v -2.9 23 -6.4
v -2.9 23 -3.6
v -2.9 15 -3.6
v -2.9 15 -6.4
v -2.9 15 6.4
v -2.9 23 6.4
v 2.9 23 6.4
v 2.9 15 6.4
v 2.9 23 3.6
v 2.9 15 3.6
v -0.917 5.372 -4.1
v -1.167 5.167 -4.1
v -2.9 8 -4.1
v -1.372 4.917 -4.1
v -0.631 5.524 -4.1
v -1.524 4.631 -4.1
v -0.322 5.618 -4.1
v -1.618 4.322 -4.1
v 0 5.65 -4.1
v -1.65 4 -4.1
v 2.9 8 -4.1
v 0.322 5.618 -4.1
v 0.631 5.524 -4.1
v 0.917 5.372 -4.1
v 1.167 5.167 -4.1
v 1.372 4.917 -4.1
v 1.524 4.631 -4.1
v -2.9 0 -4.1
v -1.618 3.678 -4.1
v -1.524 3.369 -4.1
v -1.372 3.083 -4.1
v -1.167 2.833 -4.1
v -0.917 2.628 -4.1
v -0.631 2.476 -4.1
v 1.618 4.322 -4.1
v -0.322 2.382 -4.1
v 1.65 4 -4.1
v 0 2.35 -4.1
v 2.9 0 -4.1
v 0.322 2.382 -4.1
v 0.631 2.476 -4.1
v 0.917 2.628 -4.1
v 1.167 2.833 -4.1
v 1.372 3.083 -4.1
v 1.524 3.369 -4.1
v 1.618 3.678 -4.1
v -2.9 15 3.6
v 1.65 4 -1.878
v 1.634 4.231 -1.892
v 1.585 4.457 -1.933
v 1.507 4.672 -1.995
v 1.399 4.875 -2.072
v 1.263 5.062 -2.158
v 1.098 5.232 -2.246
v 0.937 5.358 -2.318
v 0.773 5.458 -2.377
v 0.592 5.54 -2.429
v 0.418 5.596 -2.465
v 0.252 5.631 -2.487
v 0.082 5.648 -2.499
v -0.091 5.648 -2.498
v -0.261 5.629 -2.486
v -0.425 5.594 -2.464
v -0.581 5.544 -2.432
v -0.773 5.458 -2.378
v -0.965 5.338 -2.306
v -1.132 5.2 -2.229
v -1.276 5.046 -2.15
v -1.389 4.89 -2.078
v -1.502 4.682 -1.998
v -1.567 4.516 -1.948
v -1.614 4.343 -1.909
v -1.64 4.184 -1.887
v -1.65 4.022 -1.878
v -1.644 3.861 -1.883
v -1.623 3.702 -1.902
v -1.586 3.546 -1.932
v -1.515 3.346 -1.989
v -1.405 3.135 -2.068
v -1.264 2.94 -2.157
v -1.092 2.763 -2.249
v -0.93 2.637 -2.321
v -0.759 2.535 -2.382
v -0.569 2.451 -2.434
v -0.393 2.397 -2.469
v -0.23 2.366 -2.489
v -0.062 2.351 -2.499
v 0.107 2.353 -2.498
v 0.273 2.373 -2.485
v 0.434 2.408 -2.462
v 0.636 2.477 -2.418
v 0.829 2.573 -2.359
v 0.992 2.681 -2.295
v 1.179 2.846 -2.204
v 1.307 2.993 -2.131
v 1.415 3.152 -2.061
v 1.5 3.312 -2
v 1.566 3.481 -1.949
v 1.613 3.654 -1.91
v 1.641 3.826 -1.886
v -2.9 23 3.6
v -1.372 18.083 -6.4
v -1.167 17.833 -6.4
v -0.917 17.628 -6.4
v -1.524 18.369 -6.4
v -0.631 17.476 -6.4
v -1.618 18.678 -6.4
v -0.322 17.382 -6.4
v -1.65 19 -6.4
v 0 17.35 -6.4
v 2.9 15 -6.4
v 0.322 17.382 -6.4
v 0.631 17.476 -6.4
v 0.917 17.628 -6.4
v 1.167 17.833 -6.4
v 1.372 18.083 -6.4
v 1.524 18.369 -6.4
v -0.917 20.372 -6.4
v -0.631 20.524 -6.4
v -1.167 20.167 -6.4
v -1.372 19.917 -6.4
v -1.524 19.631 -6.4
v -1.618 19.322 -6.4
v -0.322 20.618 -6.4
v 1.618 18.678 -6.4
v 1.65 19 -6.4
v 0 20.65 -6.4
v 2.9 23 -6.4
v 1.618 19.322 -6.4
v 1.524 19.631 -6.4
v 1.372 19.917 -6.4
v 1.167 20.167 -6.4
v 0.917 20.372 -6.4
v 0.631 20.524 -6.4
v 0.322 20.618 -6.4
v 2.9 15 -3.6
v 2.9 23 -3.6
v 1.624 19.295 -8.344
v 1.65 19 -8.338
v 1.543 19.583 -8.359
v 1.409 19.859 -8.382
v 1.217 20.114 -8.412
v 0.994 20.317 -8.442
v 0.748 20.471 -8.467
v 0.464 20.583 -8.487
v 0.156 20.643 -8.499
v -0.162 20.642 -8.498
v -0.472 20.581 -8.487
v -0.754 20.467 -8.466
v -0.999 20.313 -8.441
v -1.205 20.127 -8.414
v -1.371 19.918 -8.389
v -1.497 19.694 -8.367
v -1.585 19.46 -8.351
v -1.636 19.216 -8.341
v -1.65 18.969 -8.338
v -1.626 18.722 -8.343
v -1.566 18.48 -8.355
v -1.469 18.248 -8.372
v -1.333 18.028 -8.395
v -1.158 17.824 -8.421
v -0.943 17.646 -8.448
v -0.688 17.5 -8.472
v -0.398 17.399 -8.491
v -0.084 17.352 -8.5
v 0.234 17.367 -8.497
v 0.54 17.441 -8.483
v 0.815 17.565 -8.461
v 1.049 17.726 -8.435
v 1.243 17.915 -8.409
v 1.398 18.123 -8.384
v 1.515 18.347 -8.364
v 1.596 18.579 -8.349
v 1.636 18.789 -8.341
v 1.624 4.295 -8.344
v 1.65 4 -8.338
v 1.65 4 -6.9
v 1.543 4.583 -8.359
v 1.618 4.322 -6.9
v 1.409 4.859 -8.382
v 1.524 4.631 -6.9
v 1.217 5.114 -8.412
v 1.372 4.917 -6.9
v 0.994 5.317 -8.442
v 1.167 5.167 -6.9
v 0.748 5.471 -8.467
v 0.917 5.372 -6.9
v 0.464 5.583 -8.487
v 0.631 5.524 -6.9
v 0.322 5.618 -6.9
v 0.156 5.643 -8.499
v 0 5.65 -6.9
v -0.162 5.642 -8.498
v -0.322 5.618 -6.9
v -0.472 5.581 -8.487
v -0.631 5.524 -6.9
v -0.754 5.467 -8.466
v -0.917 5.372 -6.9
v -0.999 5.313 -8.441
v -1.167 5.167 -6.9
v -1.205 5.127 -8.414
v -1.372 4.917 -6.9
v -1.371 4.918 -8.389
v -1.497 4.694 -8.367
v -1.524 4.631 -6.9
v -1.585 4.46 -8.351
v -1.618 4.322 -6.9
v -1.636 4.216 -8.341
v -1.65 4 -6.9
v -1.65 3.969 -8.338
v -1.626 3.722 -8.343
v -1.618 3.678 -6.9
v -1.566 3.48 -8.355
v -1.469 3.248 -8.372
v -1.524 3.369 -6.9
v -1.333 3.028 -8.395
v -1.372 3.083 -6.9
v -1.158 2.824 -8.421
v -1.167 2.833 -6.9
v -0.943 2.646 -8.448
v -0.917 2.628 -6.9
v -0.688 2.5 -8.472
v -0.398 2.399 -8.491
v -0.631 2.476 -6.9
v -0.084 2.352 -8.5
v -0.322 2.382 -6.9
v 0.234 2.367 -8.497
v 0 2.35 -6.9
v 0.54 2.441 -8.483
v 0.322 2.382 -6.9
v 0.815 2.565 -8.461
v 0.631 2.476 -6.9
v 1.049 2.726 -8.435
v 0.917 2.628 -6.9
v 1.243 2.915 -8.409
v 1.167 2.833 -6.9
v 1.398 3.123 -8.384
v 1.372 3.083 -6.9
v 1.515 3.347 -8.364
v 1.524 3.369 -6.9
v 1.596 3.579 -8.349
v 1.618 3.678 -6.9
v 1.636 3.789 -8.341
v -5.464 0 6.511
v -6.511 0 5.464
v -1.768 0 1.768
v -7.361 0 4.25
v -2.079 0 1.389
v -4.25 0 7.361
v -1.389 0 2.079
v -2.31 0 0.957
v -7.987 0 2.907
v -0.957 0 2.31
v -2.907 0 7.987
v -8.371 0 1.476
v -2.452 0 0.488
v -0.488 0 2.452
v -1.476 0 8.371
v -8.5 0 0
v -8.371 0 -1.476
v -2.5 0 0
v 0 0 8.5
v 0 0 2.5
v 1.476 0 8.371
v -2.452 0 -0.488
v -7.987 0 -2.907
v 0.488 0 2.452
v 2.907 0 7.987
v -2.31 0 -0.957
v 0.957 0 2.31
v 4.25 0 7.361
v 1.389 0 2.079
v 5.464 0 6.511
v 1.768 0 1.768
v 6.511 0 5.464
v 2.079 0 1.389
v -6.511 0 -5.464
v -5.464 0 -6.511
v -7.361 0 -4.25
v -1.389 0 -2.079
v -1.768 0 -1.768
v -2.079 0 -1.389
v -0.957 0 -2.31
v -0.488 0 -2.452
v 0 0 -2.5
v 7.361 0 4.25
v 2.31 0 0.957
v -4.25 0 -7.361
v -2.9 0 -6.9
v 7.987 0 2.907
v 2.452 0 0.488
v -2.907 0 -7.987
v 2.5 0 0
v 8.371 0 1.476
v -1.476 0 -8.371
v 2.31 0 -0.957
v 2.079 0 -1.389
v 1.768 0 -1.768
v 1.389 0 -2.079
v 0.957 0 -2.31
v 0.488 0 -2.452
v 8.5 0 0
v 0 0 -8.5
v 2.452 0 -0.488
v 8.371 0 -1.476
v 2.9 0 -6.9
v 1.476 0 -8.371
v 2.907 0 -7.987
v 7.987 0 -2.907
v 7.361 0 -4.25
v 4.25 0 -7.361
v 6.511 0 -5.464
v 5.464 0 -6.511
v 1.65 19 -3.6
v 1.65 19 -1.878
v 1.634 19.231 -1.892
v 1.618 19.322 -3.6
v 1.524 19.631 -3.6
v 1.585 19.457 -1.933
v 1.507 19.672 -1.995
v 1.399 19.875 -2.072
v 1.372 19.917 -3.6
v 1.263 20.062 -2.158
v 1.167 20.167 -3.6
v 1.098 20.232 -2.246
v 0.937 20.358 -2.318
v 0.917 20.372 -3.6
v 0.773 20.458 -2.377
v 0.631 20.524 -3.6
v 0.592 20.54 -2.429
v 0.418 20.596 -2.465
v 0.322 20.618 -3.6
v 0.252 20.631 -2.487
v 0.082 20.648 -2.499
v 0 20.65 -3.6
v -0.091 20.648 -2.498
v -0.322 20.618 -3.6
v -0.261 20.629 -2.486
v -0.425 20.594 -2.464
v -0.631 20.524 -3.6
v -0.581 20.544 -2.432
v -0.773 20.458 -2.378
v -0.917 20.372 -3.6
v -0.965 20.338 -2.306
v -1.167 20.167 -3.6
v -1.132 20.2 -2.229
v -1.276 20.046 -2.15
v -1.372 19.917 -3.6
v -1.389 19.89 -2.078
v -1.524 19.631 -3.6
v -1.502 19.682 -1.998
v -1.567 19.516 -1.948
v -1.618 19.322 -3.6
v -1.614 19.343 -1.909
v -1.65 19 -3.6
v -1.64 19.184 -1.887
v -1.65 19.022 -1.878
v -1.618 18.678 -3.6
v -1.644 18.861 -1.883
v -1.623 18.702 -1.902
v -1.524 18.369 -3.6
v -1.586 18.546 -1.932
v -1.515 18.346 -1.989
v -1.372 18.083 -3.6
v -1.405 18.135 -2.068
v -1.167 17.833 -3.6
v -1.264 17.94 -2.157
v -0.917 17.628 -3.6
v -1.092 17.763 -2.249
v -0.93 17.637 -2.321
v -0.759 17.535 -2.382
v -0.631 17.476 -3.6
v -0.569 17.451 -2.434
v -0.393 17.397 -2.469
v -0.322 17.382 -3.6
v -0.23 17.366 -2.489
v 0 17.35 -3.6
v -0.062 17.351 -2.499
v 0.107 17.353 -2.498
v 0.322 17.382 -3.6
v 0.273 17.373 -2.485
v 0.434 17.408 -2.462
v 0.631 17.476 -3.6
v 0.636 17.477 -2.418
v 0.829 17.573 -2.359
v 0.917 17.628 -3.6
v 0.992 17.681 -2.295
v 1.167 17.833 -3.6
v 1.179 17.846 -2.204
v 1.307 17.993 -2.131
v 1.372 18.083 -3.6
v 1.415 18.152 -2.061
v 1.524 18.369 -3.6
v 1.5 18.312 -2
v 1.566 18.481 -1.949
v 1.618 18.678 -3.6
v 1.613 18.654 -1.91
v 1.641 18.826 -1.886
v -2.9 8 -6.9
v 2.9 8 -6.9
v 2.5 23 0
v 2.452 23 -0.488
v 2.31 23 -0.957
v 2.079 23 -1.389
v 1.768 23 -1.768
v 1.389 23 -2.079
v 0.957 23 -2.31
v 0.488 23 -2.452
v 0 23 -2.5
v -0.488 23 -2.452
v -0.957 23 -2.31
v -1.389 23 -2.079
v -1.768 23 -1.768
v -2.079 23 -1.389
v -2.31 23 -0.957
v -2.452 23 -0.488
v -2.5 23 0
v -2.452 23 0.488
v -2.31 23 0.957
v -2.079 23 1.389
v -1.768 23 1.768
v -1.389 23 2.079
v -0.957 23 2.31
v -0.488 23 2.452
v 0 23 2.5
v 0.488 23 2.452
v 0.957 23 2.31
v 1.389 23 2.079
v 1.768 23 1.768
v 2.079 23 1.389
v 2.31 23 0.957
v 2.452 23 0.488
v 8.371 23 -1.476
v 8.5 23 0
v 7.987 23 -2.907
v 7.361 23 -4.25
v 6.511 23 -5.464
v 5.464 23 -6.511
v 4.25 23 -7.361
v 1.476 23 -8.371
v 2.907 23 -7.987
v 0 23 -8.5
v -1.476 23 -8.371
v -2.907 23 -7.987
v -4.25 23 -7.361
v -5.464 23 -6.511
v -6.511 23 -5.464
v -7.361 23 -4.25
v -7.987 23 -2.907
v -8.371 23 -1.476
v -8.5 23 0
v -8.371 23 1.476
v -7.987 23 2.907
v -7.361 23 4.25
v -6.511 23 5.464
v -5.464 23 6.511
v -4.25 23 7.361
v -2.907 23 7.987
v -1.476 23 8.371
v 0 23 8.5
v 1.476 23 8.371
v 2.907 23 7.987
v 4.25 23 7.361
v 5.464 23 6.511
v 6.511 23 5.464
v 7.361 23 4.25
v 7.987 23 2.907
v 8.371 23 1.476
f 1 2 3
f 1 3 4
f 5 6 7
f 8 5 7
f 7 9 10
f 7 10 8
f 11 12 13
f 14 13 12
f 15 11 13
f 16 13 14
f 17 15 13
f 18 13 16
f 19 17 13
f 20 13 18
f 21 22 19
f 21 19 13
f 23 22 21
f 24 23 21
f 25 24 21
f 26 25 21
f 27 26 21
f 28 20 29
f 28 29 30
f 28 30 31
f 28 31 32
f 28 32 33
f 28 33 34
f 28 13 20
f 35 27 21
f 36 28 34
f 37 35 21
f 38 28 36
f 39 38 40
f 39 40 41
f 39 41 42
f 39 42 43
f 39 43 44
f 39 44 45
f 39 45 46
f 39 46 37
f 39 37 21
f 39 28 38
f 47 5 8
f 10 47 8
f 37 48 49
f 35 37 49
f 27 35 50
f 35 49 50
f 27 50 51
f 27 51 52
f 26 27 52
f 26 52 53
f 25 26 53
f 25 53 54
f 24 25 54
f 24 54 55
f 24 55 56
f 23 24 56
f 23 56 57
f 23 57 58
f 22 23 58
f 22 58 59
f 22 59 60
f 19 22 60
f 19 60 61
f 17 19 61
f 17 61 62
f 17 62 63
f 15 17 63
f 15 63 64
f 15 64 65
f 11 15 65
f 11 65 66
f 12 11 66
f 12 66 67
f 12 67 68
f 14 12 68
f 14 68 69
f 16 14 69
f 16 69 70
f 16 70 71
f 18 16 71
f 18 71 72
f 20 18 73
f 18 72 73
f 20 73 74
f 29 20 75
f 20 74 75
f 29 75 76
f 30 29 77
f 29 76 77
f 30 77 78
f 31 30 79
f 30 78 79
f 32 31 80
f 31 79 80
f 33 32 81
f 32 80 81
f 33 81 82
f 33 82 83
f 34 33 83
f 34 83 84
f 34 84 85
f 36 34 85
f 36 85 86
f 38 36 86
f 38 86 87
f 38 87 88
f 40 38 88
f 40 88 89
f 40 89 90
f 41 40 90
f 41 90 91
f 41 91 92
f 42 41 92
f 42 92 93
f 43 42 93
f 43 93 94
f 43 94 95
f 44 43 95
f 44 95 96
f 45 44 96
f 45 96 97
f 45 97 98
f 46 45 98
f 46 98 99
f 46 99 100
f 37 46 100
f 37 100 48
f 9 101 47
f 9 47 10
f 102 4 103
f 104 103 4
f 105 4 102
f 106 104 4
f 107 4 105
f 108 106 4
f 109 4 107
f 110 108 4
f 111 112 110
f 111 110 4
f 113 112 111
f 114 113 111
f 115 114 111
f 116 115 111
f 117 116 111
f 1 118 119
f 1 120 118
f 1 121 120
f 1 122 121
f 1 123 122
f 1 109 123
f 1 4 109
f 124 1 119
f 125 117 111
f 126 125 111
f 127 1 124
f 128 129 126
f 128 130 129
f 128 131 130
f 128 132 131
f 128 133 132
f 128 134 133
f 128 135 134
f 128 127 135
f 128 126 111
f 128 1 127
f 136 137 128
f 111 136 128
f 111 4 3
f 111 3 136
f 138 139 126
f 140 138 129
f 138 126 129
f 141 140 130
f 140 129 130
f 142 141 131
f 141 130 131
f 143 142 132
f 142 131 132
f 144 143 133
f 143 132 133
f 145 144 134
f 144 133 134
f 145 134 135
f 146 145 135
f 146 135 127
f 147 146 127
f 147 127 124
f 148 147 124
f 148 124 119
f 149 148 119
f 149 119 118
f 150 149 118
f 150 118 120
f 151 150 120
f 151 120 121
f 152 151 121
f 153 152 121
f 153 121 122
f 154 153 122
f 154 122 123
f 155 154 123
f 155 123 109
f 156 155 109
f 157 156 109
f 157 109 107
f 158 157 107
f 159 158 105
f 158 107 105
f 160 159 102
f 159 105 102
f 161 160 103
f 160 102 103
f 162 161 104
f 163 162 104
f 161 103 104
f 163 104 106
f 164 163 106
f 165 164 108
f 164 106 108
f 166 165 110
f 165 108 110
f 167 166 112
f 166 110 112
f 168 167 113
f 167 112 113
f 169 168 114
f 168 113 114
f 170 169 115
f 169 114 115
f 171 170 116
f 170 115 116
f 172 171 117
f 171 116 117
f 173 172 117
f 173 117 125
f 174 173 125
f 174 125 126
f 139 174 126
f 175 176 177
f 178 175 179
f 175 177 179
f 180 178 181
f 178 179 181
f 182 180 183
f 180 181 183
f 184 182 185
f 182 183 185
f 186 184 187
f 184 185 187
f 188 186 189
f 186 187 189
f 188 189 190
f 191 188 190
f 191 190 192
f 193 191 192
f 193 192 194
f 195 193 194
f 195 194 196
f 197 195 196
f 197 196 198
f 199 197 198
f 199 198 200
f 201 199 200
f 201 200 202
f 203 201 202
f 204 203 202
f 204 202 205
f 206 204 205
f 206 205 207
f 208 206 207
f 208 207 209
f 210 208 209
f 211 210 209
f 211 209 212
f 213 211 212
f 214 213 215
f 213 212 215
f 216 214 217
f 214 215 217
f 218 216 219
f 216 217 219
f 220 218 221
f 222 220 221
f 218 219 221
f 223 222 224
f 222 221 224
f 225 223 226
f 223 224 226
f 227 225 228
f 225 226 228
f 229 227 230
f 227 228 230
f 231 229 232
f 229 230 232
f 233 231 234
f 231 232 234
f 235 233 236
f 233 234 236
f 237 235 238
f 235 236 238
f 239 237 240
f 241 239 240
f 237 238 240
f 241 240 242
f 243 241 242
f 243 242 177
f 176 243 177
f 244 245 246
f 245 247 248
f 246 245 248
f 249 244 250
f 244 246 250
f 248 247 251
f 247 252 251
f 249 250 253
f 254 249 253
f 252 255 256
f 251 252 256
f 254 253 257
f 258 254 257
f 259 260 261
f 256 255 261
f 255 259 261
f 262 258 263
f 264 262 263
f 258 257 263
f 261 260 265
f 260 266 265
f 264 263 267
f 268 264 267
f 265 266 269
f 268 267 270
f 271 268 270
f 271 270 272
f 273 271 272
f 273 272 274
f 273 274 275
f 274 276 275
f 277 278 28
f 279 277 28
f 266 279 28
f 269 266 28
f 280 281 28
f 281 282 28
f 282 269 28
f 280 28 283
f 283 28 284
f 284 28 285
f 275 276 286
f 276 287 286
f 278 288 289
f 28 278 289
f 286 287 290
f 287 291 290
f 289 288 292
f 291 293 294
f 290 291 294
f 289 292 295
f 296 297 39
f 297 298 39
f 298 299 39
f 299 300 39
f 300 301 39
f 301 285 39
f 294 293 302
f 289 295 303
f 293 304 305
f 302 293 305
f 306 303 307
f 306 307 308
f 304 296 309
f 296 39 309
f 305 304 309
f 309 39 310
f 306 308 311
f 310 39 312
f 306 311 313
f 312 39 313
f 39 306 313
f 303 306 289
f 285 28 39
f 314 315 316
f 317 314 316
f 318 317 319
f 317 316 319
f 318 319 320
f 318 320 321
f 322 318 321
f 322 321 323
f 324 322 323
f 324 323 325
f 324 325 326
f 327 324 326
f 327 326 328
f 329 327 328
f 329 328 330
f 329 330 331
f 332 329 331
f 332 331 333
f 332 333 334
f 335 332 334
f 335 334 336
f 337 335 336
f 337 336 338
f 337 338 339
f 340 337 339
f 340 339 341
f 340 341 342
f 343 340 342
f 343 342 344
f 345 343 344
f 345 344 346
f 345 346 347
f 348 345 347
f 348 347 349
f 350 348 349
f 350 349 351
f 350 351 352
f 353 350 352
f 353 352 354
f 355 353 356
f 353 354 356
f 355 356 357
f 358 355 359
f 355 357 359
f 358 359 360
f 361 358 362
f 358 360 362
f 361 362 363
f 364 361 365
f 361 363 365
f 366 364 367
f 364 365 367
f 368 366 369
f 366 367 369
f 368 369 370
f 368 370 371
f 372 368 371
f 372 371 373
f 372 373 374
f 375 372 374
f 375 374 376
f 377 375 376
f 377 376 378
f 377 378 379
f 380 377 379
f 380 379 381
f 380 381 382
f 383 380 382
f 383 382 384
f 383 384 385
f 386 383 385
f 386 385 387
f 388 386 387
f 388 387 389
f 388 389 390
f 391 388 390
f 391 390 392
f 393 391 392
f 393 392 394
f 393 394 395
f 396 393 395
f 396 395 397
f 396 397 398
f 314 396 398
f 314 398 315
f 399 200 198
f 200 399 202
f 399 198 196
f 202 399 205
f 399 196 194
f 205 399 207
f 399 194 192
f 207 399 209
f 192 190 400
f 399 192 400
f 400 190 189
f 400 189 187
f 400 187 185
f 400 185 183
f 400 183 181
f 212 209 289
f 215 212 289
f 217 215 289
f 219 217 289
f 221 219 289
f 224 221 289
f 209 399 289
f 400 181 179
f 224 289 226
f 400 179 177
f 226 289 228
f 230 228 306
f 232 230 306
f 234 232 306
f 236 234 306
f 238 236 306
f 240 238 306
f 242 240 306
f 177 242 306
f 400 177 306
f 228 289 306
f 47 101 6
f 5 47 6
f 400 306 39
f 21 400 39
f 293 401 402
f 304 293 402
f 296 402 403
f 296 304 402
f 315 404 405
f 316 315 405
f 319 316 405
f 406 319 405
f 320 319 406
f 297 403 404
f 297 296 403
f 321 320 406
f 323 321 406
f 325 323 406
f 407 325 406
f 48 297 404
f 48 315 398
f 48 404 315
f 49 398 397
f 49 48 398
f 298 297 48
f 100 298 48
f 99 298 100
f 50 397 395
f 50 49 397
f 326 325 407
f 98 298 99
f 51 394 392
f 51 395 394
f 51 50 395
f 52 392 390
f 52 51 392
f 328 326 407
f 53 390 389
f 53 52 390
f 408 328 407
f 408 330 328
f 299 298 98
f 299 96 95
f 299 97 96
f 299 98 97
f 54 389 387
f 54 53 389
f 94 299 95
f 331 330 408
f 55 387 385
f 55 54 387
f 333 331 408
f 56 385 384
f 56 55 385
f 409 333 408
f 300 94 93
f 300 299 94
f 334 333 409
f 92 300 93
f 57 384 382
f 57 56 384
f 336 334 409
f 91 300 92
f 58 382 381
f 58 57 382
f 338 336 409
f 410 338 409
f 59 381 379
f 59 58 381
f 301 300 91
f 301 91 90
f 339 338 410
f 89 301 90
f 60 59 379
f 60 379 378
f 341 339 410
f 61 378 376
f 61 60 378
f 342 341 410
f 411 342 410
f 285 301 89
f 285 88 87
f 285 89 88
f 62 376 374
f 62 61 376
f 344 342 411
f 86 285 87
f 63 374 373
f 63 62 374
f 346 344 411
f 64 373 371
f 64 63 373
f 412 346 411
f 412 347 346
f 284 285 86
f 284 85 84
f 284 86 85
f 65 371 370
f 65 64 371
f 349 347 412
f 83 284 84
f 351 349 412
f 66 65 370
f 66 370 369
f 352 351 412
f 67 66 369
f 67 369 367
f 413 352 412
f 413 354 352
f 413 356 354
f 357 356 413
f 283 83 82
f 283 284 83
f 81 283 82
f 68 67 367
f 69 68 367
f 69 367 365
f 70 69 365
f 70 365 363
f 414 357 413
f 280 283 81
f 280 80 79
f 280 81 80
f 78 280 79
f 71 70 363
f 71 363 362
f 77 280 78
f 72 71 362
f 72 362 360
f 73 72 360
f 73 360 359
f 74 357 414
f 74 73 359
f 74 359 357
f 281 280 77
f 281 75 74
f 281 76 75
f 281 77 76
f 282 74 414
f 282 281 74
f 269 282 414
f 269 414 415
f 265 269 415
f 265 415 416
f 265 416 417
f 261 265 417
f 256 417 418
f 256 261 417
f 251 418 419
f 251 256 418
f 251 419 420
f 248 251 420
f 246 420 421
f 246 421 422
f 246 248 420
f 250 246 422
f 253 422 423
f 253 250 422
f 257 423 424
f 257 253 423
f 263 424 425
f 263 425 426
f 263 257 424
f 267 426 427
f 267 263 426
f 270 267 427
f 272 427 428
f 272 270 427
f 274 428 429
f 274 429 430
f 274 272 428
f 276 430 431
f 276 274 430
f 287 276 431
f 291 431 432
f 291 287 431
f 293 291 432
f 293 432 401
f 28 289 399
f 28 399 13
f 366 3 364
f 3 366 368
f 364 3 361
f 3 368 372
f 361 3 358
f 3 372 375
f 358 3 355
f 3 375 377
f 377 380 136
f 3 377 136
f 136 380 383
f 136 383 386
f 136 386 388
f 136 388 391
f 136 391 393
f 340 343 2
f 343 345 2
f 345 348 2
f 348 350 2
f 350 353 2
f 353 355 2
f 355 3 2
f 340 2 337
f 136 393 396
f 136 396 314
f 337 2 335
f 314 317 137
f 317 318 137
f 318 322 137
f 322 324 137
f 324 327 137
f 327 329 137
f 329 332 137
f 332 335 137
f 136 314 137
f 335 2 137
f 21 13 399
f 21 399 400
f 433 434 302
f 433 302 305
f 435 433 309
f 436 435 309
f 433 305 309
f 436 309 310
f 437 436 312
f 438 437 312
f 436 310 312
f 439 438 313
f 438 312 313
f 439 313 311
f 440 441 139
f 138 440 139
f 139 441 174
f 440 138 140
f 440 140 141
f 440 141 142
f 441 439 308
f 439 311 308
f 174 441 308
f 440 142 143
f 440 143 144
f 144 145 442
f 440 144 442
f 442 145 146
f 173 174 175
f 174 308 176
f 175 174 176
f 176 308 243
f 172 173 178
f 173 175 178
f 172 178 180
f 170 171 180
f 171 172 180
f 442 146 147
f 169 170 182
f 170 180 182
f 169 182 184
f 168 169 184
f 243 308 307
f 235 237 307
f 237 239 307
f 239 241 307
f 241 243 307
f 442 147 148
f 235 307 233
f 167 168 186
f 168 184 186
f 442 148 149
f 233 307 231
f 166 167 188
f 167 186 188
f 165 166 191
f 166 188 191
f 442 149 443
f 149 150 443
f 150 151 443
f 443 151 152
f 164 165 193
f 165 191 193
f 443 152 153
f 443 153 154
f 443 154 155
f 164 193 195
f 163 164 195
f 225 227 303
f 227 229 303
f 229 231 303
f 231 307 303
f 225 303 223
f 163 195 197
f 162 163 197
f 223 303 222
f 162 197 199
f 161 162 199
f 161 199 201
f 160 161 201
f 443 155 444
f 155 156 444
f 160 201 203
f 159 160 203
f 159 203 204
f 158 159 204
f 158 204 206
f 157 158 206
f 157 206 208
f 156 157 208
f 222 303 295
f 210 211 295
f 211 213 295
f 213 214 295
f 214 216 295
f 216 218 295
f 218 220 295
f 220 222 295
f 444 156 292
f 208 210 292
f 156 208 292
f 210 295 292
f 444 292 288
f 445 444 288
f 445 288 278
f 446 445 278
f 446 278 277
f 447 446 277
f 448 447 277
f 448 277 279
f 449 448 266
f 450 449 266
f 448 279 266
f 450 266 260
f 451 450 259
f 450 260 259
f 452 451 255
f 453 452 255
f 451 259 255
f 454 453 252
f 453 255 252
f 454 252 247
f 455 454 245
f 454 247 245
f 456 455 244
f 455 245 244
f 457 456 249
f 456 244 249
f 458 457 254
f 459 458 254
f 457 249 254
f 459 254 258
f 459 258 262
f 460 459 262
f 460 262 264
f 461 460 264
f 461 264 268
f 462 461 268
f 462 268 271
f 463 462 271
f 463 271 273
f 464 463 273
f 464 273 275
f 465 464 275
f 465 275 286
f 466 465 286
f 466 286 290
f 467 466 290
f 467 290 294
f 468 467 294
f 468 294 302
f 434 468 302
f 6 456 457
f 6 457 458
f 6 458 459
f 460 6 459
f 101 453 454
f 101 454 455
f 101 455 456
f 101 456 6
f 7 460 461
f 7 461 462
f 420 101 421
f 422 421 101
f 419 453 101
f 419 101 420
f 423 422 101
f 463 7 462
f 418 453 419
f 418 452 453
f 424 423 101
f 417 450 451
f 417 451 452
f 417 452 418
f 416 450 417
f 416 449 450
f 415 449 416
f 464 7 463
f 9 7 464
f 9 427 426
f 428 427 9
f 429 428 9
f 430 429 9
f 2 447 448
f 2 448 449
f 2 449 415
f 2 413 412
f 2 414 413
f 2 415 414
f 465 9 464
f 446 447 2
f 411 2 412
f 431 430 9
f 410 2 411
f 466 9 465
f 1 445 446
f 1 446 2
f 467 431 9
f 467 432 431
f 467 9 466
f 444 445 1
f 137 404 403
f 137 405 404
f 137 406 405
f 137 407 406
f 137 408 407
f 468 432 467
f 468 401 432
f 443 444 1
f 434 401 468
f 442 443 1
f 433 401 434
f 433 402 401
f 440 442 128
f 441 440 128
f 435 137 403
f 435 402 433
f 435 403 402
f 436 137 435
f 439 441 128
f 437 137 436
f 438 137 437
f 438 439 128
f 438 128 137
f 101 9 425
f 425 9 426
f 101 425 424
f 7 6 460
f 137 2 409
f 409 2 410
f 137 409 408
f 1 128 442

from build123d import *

# Parameters (mm, degrees)
SKETCH1_R           = 8.5
SKETCH1_R_2         = 2.5
BOSS_EXTRUDE1_DEPTH = 23
SKETCH3_W           = 5.8
SKETCH3_H           = 2.8
CUT_EXTRUDE2_DEPTH  = 8
SKETCH7_W           = 5.8
SKETCH7_H           = 2.8
CUT_EXTRUDE5_DEPTH  = 8
SKETCH4_R           = 1.65
CUT_EXTRUDE3_DEPTH  = 9.5


with BuildPart() as part:
    # Sketch1 → Boss-Extrude1 (new body)
    with BuildSketch(Plane(origin=(0, 0, 0), x_dir=(1, 0, 0), z_dir=(0, 1, 0))):
        Circle(SKETCH1_R)
        Circle(SKETCH1_R_2, mode=Mode.SUBTRACT)
    extrude(amount=BOSS_EXTRUDE1_DEPTH)

    # Sketch3 → Cut-Extrude2 (cut)
    with BuildSketch(Plane(origin=(0, 23, 0), x_dir=(1, 0, 0), z_dir=(0, 1, 0))):
        with Locations((0, 5)):
            Rectangle(SKETCH3_W, SKETCH3_H)
    cut_extrude2 = extrude(amount=-CUT_EXTRUDE2_DEPTH, mode=Mode.SUBTRACT)

    # Sketch7 → Cut-Extrude5 (cut)
    with BuildSketch(Plane.XZ):
        with Locations((0, -5.5)):
            Rectangle(SKETCH7_W, SKETCH7_H)
    extrude(amount=-CUT_EXTRUDE5_DEPTH, mode=Mode.SUBTRACT)

    # Sketch4 → Cut-Extrude3 (cut, through all)
    with BuildSketch(Plane.XY):
        with Locations((0, 19)):
            Circle(SKETCH4_R)
        with Locations((0, 4)):
            Circle(SKETCH4_R)
    extrude(amount=-CUT_EXTRUDE3_DEPTH, mode=Mode.SUBTRACT)

    # Mirror1: Cut-Extrude2 across plane
    add(cut_extrude2.mirror(Plane.XY), mode=Mode.SUBTRACT)


solid = part.part
